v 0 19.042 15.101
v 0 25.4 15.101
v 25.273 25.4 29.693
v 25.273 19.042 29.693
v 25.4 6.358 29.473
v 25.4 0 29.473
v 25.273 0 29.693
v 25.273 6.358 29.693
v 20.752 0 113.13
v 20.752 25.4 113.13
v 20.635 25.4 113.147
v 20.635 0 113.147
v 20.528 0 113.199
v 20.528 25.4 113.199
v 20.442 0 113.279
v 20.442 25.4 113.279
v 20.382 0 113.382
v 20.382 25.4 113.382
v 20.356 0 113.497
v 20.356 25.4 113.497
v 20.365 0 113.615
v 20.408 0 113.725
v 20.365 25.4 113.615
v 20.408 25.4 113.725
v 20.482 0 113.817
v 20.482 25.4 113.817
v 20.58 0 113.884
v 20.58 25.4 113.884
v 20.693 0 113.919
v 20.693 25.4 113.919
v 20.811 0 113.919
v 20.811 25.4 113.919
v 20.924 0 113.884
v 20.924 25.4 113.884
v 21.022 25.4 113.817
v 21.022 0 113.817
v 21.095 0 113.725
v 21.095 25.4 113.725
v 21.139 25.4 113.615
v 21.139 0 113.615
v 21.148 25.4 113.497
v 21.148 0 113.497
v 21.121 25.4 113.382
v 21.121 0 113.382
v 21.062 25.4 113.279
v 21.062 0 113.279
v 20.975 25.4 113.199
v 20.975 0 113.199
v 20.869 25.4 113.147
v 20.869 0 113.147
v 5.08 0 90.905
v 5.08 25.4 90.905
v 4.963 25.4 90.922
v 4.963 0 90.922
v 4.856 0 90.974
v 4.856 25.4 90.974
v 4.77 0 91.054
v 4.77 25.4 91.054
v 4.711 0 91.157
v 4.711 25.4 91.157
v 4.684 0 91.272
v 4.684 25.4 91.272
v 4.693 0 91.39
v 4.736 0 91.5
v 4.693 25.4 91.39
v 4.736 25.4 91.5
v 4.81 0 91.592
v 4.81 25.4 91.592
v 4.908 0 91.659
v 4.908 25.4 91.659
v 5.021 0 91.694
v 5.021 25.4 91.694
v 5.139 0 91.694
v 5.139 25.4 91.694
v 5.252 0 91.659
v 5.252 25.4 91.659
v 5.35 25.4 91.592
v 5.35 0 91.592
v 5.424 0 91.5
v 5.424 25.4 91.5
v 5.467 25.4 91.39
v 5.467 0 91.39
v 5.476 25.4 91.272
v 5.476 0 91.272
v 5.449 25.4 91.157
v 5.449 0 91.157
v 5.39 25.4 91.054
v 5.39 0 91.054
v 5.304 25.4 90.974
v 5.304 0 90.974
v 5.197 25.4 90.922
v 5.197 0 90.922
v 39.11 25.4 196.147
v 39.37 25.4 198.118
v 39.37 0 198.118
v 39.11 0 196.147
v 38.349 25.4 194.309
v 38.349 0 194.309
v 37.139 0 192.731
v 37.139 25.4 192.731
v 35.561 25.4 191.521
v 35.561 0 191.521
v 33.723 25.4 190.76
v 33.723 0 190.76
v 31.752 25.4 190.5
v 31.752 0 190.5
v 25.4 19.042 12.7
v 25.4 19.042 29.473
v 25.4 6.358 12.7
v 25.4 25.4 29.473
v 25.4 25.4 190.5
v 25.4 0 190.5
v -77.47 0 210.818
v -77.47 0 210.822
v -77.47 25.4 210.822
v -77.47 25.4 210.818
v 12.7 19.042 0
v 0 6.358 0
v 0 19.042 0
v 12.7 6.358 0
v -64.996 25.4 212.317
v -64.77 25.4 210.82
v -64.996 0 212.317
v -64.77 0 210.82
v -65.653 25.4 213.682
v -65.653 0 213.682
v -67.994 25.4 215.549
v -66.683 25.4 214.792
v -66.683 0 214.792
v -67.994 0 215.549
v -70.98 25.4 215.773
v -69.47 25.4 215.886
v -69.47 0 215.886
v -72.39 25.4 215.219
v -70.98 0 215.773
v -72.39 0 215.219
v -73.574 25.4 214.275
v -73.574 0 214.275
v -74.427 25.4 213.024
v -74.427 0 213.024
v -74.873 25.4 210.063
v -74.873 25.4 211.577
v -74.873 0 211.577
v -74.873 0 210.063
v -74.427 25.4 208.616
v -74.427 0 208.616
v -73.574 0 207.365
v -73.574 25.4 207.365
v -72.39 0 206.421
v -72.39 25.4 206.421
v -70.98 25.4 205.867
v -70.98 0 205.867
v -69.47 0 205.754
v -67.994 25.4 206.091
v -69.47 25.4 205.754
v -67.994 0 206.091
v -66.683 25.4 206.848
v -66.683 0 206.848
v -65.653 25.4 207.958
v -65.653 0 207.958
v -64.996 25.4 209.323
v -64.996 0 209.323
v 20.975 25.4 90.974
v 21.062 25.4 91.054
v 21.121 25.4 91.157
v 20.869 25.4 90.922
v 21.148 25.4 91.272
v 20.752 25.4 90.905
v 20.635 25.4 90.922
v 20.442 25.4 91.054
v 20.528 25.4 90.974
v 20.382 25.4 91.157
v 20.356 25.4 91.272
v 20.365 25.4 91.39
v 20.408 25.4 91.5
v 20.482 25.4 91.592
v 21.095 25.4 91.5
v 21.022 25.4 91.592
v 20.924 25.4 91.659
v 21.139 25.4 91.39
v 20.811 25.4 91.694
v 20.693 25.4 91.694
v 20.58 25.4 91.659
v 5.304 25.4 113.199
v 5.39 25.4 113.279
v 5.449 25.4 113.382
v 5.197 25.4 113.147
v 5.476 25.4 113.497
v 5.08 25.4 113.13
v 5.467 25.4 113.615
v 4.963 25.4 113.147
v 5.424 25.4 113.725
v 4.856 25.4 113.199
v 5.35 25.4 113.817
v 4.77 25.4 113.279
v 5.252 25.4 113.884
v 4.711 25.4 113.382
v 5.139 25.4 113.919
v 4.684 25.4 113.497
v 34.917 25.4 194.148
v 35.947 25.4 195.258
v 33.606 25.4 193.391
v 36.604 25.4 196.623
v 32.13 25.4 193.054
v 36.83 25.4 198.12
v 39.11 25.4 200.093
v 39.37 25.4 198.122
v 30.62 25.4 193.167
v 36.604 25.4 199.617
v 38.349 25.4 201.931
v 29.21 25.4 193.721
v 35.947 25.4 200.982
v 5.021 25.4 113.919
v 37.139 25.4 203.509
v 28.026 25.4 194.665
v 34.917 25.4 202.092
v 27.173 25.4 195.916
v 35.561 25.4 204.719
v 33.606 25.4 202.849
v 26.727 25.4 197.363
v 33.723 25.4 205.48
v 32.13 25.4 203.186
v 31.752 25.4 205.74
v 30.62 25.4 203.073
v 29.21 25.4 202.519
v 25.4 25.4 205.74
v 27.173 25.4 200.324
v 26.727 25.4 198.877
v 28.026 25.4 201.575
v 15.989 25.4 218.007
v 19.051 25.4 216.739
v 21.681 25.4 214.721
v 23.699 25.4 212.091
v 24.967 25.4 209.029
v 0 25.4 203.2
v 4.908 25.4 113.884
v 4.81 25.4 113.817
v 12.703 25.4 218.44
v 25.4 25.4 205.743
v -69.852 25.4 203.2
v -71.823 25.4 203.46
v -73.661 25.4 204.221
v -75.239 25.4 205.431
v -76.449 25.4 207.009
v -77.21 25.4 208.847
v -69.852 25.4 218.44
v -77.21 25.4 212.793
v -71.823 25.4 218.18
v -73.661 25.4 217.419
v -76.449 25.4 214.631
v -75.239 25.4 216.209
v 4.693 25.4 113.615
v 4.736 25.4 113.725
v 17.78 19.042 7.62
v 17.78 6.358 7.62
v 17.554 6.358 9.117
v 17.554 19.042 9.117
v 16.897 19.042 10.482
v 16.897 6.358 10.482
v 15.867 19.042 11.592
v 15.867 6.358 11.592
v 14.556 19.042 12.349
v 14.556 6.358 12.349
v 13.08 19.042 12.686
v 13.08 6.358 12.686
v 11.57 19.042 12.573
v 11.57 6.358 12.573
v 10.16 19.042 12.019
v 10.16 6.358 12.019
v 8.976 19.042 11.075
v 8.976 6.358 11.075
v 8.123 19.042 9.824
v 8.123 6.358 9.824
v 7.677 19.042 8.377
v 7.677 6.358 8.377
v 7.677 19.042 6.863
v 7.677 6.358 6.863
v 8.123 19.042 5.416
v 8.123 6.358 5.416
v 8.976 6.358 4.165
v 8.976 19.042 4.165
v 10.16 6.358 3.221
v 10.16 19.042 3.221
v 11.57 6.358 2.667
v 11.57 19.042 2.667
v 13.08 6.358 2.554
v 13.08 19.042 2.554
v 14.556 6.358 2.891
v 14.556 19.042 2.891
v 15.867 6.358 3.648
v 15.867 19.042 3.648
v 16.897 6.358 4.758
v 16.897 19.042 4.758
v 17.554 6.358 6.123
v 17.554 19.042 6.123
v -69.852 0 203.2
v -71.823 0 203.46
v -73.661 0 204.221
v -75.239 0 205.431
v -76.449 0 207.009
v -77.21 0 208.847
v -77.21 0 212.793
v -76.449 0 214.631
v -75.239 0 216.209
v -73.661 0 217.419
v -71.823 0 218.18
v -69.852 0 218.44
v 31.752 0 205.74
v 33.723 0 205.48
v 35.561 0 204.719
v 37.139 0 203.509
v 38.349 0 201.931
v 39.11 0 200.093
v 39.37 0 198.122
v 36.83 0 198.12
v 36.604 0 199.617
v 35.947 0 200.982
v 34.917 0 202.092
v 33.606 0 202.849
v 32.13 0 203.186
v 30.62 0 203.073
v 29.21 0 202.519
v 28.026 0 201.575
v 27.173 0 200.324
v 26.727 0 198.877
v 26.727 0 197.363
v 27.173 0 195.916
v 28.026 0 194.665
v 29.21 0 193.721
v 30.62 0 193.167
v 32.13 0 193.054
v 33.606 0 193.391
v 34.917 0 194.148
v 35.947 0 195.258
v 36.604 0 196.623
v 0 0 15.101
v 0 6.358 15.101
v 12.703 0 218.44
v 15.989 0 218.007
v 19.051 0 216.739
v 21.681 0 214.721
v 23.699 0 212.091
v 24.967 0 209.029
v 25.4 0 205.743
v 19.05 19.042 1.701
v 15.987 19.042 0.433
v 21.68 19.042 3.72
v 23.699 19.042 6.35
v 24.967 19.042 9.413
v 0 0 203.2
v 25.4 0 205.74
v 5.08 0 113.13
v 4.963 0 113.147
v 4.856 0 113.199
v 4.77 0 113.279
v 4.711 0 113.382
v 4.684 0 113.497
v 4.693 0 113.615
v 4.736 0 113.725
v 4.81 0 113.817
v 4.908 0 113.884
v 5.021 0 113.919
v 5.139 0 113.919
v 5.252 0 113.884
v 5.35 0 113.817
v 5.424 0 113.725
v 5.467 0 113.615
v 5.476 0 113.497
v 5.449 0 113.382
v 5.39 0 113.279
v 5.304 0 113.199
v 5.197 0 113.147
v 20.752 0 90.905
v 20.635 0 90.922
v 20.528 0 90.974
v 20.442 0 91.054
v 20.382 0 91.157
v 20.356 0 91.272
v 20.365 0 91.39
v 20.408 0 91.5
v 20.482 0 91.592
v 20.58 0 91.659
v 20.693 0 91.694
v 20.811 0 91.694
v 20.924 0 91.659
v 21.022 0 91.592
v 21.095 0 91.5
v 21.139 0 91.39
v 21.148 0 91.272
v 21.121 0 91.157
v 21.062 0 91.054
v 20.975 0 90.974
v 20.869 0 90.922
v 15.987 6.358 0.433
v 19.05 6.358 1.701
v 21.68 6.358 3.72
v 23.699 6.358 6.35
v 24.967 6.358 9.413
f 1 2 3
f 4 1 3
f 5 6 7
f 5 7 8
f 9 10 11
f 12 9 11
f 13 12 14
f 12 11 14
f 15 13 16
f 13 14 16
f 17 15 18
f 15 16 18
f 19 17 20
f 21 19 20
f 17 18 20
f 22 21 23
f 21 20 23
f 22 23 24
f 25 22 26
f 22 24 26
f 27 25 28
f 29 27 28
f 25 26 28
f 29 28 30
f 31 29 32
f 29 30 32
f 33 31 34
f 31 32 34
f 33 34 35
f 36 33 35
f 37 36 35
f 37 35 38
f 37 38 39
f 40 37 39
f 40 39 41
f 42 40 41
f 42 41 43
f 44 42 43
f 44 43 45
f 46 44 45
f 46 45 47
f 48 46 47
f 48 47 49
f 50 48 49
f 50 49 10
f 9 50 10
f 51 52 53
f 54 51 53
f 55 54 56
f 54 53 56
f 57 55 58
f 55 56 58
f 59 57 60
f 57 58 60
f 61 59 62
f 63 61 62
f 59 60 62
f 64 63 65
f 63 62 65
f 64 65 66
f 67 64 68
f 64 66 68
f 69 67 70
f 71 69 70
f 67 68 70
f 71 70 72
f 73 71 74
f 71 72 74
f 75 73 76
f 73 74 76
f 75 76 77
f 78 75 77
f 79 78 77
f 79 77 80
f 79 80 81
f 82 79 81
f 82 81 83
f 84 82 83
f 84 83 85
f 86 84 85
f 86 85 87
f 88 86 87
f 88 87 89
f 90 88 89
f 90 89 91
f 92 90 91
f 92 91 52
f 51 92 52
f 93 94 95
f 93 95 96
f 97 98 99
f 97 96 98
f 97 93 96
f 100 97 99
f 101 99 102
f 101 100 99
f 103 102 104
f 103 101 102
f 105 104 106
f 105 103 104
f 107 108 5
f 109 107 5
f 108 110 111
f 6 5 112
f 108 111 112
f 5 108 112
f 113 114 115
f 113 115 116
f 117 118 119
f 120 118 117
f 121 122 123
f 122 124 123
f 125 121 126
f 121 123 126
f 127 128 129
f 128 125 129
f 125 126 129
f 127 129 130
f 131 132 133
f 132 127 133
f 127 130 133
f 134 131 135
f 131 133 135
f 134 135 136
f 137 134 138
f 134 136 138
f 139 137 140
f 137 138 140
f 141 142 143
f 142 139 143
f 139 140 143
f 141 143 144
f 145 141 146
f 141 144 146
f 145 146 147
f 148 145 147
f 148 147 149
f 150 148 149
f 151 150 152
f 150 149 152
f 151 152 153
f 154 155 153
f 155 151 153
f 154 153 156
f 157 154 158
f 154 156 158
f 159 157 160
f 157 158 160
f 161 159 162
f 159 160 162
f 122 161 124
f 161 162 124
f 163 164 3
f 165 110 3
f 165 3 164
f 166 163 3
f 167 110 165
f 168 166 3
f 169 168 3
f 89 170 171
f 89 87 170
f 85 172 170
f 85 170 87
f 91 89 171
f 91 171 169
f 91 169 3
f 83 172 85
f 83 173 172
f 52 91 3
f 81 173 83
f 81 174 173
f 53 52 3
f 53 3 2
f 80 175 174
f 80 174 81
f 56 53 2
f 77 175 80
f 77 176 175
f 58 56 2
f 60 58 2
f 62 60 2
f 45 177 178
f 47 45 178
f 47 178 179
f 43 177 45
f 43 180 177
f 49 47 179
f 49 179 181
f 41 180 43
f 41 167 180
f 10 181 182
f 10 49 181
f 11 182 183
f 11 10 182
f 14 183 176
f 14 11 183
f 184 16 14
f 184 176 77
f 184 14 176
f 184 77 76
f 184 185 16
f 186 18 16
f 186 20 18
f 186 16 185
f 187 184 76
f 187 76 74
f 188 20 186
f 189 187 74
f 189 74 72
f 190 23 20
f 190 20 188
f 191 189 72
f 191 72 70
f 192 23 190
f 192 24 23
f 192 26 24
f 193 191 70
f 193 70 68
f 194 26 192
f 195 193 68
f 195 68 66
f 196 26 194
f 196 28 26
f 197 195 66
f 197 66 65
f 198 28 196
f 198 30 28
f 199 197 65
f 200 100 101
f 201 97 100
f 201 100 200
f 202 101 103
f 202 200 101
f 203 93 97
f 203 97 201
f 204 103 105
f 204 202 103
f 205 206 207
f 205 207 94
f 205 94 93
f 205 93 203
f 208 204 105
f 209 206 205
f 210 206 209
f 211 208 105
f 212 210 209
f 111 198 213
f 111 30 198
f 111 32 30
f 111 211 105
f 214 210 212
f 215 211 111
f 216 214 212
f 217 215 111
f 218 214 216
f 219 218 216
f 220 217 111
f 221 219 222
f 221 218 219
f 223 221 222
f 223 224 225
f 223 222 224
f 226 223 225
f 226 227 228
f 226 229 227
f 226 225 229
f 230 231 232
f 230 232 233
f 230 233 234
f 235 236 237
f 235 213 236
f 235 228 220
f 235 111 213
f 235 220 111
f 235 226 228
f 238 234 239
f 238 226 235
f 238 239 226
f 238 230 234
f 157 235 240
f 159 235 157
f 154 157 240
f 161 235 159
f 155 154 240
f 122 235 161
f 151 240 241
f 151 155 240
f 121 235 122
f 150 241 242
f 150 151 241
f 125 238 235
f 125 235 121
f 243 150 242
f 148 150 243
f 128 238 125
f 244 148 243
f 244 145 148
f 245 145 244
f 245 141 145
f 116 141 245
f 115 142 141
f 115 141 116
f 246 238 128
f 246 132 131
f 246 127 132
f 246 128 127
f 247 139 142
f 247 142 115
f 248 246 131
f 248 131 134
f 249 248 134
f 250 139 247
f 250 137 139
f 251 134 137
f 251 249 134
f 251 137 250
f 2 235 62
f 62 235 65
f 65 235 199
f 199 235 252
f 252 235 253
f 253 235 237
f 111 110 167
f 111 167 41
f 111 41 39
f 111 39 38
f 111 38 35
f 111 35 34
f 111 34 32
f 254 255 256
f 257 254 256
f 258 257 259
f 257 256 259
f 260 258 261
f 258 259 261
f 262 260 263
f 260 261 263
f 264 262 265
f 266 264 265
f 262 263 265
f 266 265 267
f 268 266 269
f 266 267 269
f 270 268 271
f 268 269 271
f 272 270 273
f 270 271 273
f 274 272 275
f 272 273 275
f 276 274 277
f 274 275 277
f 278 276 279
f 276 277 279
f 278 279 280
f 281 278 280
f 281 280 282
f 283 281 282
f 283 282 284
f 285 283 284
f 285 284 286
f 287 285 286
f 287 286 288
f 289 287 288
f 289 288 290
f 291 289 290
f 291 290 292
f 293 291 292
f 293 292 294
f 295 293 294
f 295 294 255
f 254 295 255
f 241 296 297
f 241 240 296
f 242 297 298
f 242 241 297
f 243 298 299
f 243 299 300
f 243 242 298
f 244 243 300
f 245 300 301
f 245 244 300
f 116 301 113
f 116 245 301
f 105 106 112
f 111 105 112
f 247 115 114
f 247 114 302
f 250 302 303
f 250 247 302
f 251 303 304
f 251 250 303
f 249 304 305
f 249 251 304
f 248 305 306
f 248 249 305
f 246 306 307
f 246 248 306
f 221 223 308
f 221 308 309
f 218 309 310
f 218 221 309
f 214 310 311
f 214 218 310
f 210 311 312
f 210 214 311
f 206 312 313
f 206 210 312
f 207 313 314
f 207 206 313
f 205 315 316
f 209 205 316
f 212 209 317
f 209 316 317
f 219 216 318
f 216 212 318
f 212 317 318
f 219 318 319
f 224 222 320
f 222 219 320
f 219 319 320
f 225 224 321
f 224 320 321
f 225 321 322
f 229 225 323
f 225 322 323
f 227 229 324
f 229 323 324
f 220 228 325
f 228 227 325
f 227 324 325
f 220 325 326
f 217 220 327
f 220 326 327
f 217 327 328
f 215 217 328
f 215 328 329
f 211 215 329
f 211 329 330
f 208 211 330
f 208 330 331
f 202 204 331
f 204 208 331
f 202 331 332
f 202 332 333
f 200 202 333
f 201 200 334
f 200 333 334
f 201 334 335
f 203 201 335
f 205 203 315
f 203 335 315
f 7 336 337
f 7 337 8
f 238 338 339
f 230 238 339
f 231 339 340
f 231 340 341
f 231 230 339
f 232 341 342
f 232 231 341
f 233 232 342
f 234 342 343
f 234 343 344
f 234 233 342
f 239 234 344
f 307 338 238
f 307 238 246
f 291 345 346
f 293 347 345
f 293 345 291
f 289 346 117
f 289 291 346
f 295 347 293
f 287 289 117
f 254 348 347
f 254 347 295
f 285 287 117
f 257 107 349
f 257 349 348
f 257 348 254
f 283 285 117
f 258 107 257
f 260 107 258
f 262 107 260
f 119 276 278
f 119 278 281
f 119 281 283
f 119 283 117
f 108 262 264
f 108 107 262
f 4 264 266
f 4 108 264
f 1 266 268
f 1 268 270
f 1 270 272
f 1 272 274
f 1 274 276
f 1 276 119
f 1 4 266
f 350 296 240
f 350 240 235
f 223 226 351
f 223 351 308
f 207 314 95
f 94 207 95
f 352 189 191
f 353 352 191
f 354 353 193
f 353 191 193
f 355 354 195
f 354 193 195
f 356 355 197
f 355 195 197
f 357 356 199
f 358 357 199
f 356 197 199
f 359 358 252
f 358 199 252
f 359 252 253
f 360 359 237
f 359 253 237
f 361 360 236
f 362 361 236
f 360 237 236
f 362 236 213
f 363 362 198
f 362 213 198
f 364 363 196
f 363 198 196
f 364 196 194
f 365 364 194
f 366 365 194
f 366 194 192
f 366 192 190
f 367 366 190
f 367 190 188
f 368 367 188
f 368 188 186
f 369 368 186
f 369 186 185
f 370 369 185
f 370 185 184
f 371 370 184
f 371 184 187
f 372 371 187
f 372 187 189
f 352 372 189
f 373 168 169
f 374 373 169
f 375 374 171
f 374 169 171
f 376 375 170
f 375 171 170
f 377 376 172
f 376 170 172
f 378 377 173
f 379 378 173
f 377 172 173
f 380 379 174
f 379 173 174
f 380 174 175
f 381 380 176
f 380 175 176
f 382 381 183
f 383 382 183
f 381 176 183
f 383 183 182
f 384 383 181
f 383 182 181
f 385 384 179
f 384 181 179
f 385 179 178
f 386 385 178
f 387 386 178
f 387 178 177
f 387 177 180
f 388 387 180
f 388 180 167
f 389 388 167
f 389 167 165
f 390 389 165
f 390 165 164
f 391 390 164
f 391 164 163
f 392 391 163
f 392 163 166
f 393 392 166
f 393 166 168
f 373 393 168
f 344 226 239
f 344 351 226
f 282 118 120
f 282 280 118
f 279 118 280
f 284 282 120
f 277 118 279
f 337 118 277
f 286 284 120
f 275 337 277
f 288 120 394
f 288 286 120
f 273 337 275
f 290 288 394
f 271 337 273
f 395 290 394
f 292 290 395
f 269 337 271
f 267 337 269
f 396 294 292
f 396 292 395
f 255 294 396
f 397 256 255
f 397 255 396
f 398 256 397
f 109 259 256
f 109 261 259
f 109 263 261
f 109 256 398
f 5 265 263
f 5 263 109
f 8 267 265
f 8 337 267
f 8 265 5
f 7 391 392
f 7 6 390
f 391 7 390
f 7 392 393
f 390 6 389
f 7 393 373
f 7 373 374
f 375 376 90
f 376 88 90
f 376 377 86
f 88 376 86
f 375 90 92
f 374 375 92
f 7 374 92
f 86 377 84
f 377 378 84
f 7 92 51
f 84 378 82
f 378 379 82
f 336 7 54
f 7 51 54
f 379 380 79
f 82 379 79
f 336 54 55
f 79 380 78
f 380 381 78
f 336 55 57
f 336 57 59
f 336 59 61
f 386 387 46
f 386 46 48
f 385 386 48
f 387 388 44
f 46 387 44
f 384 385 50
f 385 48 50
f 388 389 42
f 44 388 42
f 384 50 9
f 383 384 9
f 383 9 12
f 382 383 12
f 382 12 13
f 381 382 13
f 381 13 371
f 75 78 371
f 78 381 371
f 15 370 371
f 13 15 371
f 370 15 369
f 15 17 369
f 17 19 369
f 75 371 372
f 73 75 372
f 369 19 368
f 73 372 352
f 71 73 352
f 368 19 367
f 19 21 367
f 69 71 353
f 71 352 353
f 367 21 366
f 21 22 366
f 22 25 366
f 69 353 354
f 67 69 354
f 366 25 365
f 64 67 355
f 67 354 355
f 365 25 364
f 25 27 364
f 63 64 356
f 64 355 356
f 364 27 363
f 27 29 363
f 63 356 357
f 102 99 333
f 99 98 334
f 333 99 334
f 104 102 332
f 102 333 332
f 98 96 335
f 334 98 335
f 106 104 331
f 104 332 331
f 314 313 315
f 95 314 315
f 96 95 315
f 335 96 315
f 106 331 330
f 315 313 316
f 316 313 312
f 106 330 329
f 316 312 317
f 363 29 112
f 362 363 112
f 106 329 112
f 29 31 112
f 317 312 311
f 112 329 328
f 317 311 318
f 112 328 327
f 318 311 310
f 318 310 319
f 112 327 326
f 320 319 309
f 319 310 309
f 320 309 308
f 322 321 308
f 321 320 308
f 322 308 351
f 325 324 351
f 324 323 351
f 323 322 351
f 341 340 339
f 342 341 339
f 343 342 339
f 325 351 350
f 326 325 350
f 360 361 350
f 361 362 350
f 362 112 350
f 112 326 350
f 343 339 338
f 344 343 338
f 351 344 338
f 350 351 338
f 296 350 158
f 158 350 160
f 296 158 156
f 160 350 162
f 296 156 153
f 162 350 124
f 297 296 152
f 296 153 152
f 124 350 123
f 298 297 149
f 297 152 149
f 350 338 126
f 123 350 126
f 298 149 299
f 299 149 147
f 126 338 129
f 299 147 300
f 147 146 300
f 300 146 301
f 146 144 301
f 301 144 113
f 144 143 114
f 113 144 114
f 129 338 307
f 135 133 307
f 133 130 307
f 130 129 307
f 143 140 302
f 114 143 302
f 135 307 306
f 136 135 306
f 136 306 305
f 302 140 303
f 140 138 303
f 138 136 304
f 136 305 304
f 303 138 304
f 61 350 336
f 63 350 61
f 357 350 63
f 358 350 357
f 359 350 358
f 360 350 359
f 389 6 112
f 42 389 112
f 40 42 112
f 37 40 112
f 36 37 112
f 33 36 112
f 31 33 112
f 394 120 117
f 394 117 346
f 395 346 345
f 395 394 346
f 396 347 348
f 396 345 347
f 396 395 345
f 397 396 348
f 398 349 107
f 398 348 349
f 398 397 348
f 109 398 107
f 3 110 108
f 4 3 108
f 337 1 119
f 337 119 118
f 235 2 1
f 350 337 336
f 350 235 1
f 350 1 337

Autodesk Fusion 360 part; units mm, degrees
sketch "Sketch1" plane through (0, 0, 0) normal (0, 1, 0) x (1, 0, 0)
  line L0 (0, 0) -> (12.7, 0)
  line L1 (25.4, -12.7) -> (25.4, -218.44)
  line L2 (25.4, -218.44) -> (0, -218.44)
  line L3 (0, -218.44) -> (0, 0)
  line L4 (0, -218.44) -> (-77.47, -218.44)
  line L5 (-77.47, -218.44) -> (-77.47, -203.2)
  line L6 (-77.47, -203.2) -> (0, -203.2)
  line L7 (0, -203.2) -> (0, -218.44)
  line L8 (25.4, -205.74) -> (39.37, -205.74)
  line L9 (39.37, -205.74) -> (39.37, -190.5)
  line L10 (39.37, -190.5) -> (25.4, -190.5)
  line L11 (25.4, -190.5) -> (25.4, -205.74)
  circle A0 centre (-69.85, -210.82) radius 5.08
  circle A1 centre (31.75, -198.12) radius 5.08
  circle A2 centre (12.7, -7.62) radius 5.08
  arc A3 (25.4, -12.7) -> (12.7, 0) centre (12.7, -12.7) ccw
  point P0 (25.4, 0)
  dimension "d1" = 25.4
  dimension "d2" = 218.44
  dimension "d3" = 77.47
  dimension "d4" = 15.24
  dimension "d5" = 13.97
  dimension "d6" = 15.24
  dimension "d7" = 10.16
  dimension "d8" = 10.16
  dimension "d9" = 10.16
  dimension "d10" = 12.7
  dimension "d11" = 7.62
  dimension "d12" = 190.5
  dimension "d13" = 7.62
  dimension "d14" = 7.62
  dimension "d15" = 7.62
  dimension "d16" = 7.62
  dimension "d17" = 12.7
extrude "Extrude1" add sketch "Sketch1" along normal blind 25.4
sketch "Sketch2" plane through (0, 0, 0) normal (0, -1, 0) x (1, 0, 0)
  circle A0 centre (-69.85, 210.82) radius 5.08
  circle A1 centre (31.75, 198.12) radius 5.08
  circle A2 centre (12.7, 7.62) radius 5.08
  line L0 (39.37, 205.74) -> (25.4, 205.74)
  line L1 (25.4, 205.74) -> (25.4, 218.44)
  line L2 (25.4, 218.44) -> (-77.47, 218.44)
  line L3 (-77.47, 218.44) -> (-77.47, 203.2)
  line L4 (-77.47, 203.2) -> (0, 203.2)
  line L5 (0, 203.2) -> (0, 0)
  line L6 (0, 0) -> (12.7, 0)
  arc A3 (12.7, 0) -> (25.4, 12.7) centre (12.7, 12.7) ccw
  line L7 (25.4, 12.7) -> (25.4, 190.5)
  line L8 (25.4, 190.5) -> (39.37, 190.5)
  line L9 (39.37, 190.5) -> (39.37, 205.74)
  line L10 (0, 0) -> (0, 20.32)
  line L11 (25.4, 20.32) -> (0, 20.32)
  line L12 (25.4, 20.32) -> (25.4, 12.7)
  line L13 (0, 0) -> (12.7, 0)
  arc A4 (12.7, 0) -> (25.4, 12.7) centre (12.7, 12.7) ccw
extrude "Extrude2" cut sketch "Sketch2" against normal blind 6.3576 contours L5 L6 A3 L7 L10 L11 L12 L13 A4
sketch "Sketch3" plane through (0, 25.4, 0) normal (0, 1, 0) x (-1, 0, 0)
  circle A0 centre (69.85, 210.82) radius 5.08
  circle A1 centre (-31.75, 198.12) radius 5.08
  circle A2 centre (-12.7, 7.62) radius 5.08
  line L0 (-25.4, 205.74) -> (-39.37, 205.74)
  line L1 (-39.37, 205.74) -> (-39.37, 190.5)
  line L2 (-39.37, 190.5) -> (-25.4, 190.5)
  line L3 (-25.4, 190.5) -> (-25.4, 12.7)
  arc A3 (-25.4, 12.7) -> (-12.7, 0) centre (-12.7, 12.7) ccw
  line L4 (-12.7, 0) -> (0, 0)
  line L5 (0, 0) -> (0, 203.2)
  line L6 (0, 203.2) -> (77.47, 203.2)
  line L7 (77.47, 203.2) -> (77.47, 218.44)
  line L8 (77.47, 218.44) -> (-25.4, 218.44)
  line L9 (-25.4, 218.44) -> (-25.4, 205.74)
  line L10 (0, 0) -> (0, 20.32)
  line L11 (-25.4, 20.32) -> (0, 20.32)
  line L12 (0, 0) -> (-12.7, 0)
  line L13 (-25.4, 20.32) -> (-25.4, 12.7)
  arc A4 (-25.4, 12.7) -> (-12.7, 0) centre (-12.7, 12.7) ccw
extrude "Extrude3" cut sketch "Sketch3" against normal blind 6.3576 contours L3 A3 L4 L5 L10 L11 L12 L13 A4
extrude "Extrude4" add 1 faces at (16.9333, 2.1192, 20.32) along direction (0, 0, -1) blind 5.5118
sketch "Sketch4" plane through (0, 0, 0) normal (0, -1, 0) x (1, 0, 0)
  line L0 (25.4, 14.8082) -> (25.4, 190.5)
  line L1 (25.4, 190.5) -> (39.37, 190.5)
  line L2 (39.37, 190.5) -> (39.37, 205.74)
  line L3 (39.37, 205.74) -> (25.4, 205.74)
  line L4 (25.4, 205.74) -> (25.4, 218.44)
  line L5 (25.4, 218.44) -> (-77.47, 218.44)
  line L6 (-77.47, 218.44) -> (-77.47, 203.2)
  line L7 (-77.47, 203.2) -> (0, 203.2)
  line L8 (0, 203.2) -> (0, 14.8082)
  line L9 (0, 14.8082) -> (25.4, 14.8082)
  circle A0 centre (-69.85, 210.82) radius 5.08
  circle A1 centre (31.75, 198.12) radius 5.08
  line L10 (0, 14.8082) -> (25.4, 29.4729)
  line L11 (25.4, 29.4729) -> (0, 29.4729)
  line L12 (0, 14.8082) -> (0, 29.4729)
  dimension "d26" = 60
extrude "Extrude5" cut sketch "Sketch4" against normal blind 6.3576 contours L0 L9 L10
extrude "Extrude6" add 1 faces at (16.9333, 23.2808, 20.32) along direction (0, 0, -1) blind 5.5118
sketch "Sketch6" plane through (0, 25.4, 0) normal (0, 1, 0) x (-1, 0, 0)
  line L0 (0, 14.8082) -> (0, 203.2)
  line L1 (0, 203.2) -> (77.47, 203.2)
  line L2 (77.47, 203.2) -> (77.47, 218.44)
  line L3 (77.47, 218.44) -> (-25.4, 218.44)
  line L4 (-25.4, 218.44) -> (-25.4, 205.74)
  line L5 (-25.4, 205.74) -> (-39.37, 205.74)
  line L6 (-39.37, 205.74) -> (-39.37, 190.5)
  line L7 (-39.37, 190.5) -> (-25.4, 190.5)
  line L8 (-25.4, 190.5) -> (-25.4, 14.8082)
  line L9 (-25.4, 14.8082) -> (0, 14.8082)
  circle A0 centre (69.85, 210.82) radius 5.08
  circle A1 centre (-31.75, 198.12) radius 5.08
  line L10 (0, 14.8082) -> (-25.4, 29.4729)
  line L11 (-25.4, 29.4729) -> (0, 29.4729)
  line L12 (0, 14.8082) -> (0, 29.4729)
  dimension "d35" = 60
extrude "Extrude8" cut sketch "Sketch6" against normal blind 6.3576 contours L8 L9 L10
extrude "Extrude9" cut 2 faces at (16.9333, 4.2384, 24.5847) (16.9333, 21.1616, 24.5847) along direction (-0.5, 0, 0.866025) blind 0.254
fillet "Fillet1" radius 7.62 2 edges at (39.37, 12.7, 205.74) (39.37, 12.7, 190.5)
fillet "Fillet2" radius 7.62 2 edges at (-77.47, 12.7, 218.44) (-77.47, 12.7, 203.2)
fillet "Fillet3" radius 12.7 1 edges at (25.4, 12.7, 218.44)
sketch "Sketch7" plane through (0, 0, 0) normal (0, -1, 0) x (1, 0, 0)
  circle A0 centre (-69.85, 210.82) radius 5.08
  circle A1 centre (31.75, 198.12) radius 5.08
  arc A2 (25.4, 205.74) -> (12.7, 218.44) centre (12.7, 205.74) ccw
  line L0 (12.7, 218.44) -> (-69.85, 218.44)
  arc A3 (-69.85, 218.44) -> (-69.85, 203.2) centre (-69.85, 210.82) ccw
  line L1 (-69.85, 203.2) -> (0, 203.2)
  line L2 (0, 203.2) -> (0, 15.1015)
  line L3 (0, 15.1015) -> (25.273, 29.6929)
  line L4 (25.273, 29.6929) -> (25.4, 29.4729)
  line L5 (25.4, 29.4729) -> (25.4, 190.5)
  line L6 (25.4, 190.5) -> (31.75, 190.5)
  arc A4 (31.75, 190.5) -> (31.75, 205.74) centre (31.75, 198.12) ccw
  line L7 (31.75, 205.74) -> (25.4, 205.74)
  circle A5 centre (5.08, 91.3015) radius 0.3969
  circle A6 centre (20.7518, 91.3015) radius 0.3969
  circle A7 centre (5.08, 113.5265) radius 0.3969
  circle A8 centre (20.7518, 113.5265) radius 0.3969
  dimension "d46" = 0.7937
  dimension "d47" = 0.7937
  dimension "d48" = 0.7937
  dimension "d49" = 0.7937
  dimension "d50" = 15.6718
  dimension "d51" = 15.6718
  dimension "d52" = 22.225
  dimension "d53" = 5.08
  dimension "d54" = 76.2
hole "Hole1" at (5.08, 0, 113.5265) at (5.08, 0, 91.3015) at (20.7518, 0, 91.3015) at (20.7518, 0, 113.5265) direction (0, 1, 0) diameter 0.7937 depth 33.02 tip angle 118
